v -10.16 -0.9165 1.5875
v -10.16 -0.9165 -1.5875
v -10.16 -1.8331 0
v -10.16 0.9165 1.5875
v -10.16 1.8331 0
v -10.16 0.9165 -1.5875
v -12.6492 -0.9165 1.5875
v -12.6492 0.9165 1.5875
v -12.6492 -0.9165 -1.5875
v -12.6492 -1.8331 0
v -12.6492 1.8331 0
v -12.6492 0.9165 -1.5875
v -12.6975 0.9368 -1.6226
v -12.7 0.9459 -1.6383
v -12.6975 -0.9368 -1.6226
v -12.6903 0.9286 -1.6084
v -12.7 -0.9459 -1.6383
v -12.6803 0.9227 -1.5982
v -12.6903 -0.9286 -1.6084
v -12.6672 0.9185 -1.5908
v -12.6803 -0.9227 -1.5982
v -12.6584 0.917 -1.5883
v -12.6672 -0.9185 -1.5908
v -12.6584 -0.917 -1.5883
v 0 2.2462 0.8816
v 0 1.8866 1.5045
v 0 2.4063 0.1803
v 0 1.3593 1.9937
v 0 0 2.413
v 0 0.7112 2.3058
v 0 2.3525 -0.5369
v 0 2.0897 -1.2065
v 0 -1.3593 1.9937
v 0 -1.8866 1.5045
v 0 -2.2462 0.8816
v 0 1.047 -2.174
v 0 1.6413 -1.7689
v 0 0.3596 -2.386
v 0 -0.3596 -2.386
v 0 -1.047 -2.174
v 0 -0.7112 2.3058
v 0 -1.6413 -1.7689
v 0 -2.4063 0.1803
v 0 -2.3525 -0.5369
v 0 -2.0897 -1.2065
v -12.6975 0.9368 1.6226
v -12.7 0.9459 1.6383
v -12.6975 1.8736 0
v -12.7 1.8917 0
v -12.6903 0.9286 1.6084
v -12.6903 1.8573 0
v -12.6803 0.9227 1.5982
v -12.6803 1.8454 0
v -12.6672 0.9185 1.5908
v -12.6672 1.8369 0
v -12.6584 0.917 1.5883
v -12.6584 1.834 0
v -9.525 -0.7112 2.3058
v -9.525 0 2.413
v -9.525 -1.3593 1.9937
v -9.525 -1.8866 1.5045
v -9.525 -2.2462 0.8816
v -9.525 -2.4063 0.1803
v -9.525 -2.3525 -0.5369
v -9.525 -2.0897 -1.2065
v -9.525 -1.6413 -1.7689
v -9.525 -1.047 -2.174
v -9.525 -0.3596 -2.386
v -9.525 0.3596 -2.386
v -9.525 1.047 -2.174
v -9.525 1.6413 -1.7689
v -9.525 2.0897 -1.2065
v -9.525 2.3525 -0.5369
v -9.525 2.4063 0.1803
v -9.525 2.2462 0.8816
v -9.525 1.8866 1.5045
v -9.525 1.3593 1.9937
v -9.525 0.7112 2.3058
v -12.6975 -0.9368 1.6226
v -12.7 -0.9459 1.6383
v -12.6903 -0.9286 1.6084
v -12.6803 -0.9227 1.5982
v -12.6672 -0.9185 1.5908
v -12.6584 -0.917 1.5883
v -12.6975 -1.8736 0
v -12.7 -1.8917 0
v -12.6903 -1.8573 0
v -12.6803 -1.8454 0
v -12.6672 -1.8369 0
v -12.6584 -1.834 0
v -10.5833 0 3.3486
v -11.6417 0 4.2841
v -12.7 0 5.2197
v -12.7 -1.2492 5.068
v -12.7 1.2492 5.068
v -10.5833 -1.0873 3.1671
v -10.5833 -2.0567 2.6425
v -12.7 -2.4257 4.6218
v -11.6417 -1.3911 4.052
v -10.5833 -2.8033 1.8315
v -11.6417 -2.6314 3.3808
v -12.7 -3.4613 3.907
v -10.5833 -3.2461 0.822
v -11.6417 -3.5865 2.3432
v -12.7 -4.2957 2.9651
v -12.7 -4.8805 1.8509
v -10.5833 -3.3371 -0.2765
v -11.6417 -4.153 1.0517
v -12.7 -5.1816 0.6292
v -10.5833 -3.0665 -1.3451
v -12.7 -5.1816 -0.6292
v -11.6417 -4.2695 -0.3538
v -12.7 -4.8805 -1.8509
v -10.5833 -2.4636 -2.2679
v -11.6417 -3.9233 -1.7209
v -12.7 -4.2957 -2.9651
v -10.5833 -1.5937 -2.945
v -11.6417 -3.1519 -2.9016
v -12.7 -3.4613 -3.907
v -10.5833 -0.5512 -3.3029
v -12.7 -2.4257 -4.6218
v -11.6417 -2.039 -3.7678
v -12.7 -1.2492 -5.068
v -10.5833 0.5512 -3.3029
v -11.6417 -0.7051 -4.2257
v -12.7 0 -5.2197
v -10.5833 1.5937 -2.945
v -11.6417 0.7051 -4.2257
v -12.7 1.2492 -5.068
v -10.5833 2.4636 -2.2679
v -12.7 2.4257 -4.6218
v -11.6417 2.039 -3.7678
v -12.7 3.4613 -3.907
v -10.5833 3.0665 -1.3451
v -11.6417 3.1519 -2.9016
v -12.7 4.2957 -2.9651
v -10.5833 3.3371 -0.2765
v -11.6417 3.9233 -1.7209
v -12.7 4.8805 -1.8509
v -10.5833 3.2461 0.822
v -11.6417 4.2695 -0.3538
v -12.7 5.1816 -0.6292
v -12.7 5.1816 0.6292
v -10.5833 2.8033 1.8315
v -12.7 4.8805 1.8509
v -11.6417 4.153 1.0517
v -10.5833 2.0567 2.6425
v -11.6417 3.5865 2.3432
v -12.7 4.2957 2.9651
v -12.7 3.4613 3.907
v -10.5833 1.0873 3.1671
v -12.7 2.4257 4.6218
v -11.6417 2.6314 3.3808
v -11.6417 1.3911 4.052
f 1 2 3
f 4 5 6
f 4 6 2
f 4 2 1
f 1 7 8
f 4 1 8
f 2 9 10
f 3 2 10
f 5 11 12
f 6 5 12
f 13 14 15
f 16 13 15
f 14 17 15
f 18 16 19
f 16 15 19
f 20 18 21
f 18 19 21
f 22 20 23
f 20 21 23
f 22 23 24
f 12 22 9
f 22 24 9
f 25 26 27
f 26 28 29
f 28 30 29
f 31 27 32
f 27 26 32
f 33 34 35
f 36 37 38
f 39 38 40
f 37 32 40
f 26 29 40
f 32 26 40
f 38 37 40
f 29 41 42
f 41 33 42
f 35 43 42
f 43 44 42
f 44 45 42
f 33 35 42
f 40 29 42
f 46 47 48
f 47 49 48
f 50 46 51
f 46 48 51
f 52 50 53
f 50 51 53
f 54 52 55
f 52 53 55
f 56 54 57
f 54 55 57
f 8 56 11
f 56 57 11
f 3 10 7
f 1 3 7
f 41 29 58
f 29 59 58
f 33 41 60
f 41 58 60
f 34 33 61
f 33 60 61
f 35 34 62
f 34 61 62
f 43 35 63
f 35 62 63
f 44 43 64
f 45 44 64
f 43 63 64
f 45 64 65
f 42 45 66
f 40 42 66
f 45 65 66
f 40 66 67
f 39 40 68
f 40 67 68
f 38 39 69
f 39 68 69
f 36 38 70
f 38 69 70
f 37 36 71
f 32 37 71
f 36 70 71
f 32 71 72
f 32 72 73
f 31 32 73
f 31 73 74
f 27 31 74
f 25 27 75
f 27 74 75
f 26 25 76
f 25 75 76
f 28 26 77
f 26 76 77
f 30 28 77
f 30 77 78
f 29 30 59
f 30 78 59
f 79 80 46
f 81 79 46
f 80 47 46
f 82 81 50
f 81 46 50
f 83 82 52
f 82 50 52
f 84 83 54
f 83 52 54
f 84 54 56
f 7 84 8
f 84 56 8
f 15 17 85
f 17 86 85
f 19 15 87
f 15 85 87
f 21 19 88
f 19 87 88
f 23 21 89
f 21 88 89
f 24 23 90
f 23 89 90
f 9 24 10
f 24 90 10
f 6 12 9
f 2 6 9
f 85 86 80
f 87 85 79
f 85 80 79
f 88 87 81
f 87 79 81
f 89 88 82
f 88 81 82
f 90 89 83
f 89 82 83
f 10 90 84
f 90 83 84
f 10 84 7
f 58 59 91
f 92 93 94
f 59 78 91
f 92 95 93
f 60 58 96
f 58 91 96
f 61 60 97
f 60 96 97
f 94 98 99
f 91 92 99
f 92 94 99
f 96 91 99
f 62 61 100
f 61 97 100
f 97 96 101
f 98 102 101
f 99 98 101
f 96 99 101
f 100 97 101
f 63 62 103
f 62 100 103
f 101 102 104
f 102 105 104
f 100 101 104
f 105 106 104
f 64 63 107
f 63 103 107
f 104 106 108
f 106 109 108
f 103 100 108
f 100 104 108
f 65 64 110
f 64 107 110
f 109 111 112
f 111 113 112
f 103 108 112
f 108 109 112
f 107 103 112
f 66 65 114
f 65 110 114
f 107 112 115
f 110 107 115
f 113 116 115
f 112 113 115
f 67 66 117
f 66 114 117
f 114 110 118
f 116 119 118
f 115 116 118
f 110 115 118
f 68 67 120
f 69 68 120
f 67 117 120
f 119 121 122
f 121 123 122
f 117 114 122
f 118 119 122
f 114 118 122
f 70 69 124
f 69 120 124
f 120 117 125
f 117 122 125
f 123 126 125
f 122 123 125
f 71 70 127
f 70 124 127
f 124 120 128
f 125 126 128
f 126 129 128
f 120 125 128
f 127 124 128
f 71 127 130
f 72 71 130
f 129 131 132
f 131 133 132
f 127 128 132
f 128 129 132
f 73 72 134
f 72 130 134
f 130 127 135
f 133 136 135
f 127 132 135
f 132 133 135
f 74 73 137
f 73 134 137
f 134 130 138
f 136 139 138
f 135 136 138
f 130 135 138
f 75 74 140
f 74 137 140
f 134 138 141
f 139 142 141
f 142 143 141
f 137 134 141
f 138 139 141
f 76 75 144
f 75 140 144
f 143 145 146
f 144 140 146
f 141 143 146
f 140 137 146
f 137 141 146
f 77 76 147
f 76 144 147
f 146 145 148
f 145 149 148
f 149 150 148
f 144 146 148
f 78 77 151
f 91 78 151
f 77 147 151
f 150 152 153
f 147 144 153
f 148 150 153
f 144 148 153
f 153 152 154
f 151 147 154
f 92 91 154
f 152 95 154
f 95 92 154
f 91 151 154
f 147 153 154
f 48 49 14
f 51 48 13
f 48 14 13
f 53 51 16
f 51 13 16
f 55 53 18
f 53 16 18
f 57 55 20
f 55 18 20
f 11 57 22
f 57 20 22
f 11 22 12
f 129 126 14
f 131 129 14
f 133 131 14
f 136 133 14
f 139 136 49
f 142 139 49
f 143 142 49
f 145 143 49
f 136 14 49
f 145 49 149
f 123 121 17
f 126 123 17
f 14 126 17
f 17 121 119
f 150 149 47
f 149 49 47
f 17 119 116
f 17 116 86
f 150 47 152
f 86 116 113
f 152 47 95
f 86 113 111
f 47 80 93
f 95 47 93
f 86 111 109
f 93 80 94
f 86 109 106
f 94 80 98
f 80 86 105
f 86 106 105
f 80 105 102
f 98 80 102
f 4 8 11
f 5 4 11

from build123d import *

# Parameters (mm, degrees)
CUT_EXTRUDE1_DEPTH = 2.54
FILLET1_R          = 0.0508


with BuildPart() as part:
    # Sketch1 → Revolve2 (revolve)
    with BuildSketch(Plane.XY):
        Polygon((0, 0), (0, 2.413), (-9.525, 2.413), (-12.7, 5.2197), (-12.7, 0), align=None)
    revolve(axis=Axis((-12.7, 0, 0), (1, 0, 0)))

    # Sketch2 → Cut-Extrude1 (cut)
    with BuildSketch(Plane.ZY.offset(12.7)):
        Polygon((0, 1.833087105), (-1.5875, 0.916543552), (-1.5875, -0.916543552), (0, -1.833087105), (1.5875, -0.916543552), (1.5875, 0.916543552), align=None)
    extrude(amount=-CUT_EXTRUDE1_DEPTH, mode=Mode.SUBTRACT)

    # Fillet1
    fillet1_edges = [part.edges().sort_by_distance(p)[0] for p in [
        (-12.7, -1.374815329, 0.79375),
        (-12.7, -1.374815329, -0.79375),
        (-12.7, 0, -1.5875),
        (-12.7, 1.374815329, -0.79375),
        (-12.7, 1.374815329, 0.79375),
        (-12.7, 0, 1.5875),
    ]]
    fillet(fillet1_edges, radius=FILLET1_R)


solid = part.part
